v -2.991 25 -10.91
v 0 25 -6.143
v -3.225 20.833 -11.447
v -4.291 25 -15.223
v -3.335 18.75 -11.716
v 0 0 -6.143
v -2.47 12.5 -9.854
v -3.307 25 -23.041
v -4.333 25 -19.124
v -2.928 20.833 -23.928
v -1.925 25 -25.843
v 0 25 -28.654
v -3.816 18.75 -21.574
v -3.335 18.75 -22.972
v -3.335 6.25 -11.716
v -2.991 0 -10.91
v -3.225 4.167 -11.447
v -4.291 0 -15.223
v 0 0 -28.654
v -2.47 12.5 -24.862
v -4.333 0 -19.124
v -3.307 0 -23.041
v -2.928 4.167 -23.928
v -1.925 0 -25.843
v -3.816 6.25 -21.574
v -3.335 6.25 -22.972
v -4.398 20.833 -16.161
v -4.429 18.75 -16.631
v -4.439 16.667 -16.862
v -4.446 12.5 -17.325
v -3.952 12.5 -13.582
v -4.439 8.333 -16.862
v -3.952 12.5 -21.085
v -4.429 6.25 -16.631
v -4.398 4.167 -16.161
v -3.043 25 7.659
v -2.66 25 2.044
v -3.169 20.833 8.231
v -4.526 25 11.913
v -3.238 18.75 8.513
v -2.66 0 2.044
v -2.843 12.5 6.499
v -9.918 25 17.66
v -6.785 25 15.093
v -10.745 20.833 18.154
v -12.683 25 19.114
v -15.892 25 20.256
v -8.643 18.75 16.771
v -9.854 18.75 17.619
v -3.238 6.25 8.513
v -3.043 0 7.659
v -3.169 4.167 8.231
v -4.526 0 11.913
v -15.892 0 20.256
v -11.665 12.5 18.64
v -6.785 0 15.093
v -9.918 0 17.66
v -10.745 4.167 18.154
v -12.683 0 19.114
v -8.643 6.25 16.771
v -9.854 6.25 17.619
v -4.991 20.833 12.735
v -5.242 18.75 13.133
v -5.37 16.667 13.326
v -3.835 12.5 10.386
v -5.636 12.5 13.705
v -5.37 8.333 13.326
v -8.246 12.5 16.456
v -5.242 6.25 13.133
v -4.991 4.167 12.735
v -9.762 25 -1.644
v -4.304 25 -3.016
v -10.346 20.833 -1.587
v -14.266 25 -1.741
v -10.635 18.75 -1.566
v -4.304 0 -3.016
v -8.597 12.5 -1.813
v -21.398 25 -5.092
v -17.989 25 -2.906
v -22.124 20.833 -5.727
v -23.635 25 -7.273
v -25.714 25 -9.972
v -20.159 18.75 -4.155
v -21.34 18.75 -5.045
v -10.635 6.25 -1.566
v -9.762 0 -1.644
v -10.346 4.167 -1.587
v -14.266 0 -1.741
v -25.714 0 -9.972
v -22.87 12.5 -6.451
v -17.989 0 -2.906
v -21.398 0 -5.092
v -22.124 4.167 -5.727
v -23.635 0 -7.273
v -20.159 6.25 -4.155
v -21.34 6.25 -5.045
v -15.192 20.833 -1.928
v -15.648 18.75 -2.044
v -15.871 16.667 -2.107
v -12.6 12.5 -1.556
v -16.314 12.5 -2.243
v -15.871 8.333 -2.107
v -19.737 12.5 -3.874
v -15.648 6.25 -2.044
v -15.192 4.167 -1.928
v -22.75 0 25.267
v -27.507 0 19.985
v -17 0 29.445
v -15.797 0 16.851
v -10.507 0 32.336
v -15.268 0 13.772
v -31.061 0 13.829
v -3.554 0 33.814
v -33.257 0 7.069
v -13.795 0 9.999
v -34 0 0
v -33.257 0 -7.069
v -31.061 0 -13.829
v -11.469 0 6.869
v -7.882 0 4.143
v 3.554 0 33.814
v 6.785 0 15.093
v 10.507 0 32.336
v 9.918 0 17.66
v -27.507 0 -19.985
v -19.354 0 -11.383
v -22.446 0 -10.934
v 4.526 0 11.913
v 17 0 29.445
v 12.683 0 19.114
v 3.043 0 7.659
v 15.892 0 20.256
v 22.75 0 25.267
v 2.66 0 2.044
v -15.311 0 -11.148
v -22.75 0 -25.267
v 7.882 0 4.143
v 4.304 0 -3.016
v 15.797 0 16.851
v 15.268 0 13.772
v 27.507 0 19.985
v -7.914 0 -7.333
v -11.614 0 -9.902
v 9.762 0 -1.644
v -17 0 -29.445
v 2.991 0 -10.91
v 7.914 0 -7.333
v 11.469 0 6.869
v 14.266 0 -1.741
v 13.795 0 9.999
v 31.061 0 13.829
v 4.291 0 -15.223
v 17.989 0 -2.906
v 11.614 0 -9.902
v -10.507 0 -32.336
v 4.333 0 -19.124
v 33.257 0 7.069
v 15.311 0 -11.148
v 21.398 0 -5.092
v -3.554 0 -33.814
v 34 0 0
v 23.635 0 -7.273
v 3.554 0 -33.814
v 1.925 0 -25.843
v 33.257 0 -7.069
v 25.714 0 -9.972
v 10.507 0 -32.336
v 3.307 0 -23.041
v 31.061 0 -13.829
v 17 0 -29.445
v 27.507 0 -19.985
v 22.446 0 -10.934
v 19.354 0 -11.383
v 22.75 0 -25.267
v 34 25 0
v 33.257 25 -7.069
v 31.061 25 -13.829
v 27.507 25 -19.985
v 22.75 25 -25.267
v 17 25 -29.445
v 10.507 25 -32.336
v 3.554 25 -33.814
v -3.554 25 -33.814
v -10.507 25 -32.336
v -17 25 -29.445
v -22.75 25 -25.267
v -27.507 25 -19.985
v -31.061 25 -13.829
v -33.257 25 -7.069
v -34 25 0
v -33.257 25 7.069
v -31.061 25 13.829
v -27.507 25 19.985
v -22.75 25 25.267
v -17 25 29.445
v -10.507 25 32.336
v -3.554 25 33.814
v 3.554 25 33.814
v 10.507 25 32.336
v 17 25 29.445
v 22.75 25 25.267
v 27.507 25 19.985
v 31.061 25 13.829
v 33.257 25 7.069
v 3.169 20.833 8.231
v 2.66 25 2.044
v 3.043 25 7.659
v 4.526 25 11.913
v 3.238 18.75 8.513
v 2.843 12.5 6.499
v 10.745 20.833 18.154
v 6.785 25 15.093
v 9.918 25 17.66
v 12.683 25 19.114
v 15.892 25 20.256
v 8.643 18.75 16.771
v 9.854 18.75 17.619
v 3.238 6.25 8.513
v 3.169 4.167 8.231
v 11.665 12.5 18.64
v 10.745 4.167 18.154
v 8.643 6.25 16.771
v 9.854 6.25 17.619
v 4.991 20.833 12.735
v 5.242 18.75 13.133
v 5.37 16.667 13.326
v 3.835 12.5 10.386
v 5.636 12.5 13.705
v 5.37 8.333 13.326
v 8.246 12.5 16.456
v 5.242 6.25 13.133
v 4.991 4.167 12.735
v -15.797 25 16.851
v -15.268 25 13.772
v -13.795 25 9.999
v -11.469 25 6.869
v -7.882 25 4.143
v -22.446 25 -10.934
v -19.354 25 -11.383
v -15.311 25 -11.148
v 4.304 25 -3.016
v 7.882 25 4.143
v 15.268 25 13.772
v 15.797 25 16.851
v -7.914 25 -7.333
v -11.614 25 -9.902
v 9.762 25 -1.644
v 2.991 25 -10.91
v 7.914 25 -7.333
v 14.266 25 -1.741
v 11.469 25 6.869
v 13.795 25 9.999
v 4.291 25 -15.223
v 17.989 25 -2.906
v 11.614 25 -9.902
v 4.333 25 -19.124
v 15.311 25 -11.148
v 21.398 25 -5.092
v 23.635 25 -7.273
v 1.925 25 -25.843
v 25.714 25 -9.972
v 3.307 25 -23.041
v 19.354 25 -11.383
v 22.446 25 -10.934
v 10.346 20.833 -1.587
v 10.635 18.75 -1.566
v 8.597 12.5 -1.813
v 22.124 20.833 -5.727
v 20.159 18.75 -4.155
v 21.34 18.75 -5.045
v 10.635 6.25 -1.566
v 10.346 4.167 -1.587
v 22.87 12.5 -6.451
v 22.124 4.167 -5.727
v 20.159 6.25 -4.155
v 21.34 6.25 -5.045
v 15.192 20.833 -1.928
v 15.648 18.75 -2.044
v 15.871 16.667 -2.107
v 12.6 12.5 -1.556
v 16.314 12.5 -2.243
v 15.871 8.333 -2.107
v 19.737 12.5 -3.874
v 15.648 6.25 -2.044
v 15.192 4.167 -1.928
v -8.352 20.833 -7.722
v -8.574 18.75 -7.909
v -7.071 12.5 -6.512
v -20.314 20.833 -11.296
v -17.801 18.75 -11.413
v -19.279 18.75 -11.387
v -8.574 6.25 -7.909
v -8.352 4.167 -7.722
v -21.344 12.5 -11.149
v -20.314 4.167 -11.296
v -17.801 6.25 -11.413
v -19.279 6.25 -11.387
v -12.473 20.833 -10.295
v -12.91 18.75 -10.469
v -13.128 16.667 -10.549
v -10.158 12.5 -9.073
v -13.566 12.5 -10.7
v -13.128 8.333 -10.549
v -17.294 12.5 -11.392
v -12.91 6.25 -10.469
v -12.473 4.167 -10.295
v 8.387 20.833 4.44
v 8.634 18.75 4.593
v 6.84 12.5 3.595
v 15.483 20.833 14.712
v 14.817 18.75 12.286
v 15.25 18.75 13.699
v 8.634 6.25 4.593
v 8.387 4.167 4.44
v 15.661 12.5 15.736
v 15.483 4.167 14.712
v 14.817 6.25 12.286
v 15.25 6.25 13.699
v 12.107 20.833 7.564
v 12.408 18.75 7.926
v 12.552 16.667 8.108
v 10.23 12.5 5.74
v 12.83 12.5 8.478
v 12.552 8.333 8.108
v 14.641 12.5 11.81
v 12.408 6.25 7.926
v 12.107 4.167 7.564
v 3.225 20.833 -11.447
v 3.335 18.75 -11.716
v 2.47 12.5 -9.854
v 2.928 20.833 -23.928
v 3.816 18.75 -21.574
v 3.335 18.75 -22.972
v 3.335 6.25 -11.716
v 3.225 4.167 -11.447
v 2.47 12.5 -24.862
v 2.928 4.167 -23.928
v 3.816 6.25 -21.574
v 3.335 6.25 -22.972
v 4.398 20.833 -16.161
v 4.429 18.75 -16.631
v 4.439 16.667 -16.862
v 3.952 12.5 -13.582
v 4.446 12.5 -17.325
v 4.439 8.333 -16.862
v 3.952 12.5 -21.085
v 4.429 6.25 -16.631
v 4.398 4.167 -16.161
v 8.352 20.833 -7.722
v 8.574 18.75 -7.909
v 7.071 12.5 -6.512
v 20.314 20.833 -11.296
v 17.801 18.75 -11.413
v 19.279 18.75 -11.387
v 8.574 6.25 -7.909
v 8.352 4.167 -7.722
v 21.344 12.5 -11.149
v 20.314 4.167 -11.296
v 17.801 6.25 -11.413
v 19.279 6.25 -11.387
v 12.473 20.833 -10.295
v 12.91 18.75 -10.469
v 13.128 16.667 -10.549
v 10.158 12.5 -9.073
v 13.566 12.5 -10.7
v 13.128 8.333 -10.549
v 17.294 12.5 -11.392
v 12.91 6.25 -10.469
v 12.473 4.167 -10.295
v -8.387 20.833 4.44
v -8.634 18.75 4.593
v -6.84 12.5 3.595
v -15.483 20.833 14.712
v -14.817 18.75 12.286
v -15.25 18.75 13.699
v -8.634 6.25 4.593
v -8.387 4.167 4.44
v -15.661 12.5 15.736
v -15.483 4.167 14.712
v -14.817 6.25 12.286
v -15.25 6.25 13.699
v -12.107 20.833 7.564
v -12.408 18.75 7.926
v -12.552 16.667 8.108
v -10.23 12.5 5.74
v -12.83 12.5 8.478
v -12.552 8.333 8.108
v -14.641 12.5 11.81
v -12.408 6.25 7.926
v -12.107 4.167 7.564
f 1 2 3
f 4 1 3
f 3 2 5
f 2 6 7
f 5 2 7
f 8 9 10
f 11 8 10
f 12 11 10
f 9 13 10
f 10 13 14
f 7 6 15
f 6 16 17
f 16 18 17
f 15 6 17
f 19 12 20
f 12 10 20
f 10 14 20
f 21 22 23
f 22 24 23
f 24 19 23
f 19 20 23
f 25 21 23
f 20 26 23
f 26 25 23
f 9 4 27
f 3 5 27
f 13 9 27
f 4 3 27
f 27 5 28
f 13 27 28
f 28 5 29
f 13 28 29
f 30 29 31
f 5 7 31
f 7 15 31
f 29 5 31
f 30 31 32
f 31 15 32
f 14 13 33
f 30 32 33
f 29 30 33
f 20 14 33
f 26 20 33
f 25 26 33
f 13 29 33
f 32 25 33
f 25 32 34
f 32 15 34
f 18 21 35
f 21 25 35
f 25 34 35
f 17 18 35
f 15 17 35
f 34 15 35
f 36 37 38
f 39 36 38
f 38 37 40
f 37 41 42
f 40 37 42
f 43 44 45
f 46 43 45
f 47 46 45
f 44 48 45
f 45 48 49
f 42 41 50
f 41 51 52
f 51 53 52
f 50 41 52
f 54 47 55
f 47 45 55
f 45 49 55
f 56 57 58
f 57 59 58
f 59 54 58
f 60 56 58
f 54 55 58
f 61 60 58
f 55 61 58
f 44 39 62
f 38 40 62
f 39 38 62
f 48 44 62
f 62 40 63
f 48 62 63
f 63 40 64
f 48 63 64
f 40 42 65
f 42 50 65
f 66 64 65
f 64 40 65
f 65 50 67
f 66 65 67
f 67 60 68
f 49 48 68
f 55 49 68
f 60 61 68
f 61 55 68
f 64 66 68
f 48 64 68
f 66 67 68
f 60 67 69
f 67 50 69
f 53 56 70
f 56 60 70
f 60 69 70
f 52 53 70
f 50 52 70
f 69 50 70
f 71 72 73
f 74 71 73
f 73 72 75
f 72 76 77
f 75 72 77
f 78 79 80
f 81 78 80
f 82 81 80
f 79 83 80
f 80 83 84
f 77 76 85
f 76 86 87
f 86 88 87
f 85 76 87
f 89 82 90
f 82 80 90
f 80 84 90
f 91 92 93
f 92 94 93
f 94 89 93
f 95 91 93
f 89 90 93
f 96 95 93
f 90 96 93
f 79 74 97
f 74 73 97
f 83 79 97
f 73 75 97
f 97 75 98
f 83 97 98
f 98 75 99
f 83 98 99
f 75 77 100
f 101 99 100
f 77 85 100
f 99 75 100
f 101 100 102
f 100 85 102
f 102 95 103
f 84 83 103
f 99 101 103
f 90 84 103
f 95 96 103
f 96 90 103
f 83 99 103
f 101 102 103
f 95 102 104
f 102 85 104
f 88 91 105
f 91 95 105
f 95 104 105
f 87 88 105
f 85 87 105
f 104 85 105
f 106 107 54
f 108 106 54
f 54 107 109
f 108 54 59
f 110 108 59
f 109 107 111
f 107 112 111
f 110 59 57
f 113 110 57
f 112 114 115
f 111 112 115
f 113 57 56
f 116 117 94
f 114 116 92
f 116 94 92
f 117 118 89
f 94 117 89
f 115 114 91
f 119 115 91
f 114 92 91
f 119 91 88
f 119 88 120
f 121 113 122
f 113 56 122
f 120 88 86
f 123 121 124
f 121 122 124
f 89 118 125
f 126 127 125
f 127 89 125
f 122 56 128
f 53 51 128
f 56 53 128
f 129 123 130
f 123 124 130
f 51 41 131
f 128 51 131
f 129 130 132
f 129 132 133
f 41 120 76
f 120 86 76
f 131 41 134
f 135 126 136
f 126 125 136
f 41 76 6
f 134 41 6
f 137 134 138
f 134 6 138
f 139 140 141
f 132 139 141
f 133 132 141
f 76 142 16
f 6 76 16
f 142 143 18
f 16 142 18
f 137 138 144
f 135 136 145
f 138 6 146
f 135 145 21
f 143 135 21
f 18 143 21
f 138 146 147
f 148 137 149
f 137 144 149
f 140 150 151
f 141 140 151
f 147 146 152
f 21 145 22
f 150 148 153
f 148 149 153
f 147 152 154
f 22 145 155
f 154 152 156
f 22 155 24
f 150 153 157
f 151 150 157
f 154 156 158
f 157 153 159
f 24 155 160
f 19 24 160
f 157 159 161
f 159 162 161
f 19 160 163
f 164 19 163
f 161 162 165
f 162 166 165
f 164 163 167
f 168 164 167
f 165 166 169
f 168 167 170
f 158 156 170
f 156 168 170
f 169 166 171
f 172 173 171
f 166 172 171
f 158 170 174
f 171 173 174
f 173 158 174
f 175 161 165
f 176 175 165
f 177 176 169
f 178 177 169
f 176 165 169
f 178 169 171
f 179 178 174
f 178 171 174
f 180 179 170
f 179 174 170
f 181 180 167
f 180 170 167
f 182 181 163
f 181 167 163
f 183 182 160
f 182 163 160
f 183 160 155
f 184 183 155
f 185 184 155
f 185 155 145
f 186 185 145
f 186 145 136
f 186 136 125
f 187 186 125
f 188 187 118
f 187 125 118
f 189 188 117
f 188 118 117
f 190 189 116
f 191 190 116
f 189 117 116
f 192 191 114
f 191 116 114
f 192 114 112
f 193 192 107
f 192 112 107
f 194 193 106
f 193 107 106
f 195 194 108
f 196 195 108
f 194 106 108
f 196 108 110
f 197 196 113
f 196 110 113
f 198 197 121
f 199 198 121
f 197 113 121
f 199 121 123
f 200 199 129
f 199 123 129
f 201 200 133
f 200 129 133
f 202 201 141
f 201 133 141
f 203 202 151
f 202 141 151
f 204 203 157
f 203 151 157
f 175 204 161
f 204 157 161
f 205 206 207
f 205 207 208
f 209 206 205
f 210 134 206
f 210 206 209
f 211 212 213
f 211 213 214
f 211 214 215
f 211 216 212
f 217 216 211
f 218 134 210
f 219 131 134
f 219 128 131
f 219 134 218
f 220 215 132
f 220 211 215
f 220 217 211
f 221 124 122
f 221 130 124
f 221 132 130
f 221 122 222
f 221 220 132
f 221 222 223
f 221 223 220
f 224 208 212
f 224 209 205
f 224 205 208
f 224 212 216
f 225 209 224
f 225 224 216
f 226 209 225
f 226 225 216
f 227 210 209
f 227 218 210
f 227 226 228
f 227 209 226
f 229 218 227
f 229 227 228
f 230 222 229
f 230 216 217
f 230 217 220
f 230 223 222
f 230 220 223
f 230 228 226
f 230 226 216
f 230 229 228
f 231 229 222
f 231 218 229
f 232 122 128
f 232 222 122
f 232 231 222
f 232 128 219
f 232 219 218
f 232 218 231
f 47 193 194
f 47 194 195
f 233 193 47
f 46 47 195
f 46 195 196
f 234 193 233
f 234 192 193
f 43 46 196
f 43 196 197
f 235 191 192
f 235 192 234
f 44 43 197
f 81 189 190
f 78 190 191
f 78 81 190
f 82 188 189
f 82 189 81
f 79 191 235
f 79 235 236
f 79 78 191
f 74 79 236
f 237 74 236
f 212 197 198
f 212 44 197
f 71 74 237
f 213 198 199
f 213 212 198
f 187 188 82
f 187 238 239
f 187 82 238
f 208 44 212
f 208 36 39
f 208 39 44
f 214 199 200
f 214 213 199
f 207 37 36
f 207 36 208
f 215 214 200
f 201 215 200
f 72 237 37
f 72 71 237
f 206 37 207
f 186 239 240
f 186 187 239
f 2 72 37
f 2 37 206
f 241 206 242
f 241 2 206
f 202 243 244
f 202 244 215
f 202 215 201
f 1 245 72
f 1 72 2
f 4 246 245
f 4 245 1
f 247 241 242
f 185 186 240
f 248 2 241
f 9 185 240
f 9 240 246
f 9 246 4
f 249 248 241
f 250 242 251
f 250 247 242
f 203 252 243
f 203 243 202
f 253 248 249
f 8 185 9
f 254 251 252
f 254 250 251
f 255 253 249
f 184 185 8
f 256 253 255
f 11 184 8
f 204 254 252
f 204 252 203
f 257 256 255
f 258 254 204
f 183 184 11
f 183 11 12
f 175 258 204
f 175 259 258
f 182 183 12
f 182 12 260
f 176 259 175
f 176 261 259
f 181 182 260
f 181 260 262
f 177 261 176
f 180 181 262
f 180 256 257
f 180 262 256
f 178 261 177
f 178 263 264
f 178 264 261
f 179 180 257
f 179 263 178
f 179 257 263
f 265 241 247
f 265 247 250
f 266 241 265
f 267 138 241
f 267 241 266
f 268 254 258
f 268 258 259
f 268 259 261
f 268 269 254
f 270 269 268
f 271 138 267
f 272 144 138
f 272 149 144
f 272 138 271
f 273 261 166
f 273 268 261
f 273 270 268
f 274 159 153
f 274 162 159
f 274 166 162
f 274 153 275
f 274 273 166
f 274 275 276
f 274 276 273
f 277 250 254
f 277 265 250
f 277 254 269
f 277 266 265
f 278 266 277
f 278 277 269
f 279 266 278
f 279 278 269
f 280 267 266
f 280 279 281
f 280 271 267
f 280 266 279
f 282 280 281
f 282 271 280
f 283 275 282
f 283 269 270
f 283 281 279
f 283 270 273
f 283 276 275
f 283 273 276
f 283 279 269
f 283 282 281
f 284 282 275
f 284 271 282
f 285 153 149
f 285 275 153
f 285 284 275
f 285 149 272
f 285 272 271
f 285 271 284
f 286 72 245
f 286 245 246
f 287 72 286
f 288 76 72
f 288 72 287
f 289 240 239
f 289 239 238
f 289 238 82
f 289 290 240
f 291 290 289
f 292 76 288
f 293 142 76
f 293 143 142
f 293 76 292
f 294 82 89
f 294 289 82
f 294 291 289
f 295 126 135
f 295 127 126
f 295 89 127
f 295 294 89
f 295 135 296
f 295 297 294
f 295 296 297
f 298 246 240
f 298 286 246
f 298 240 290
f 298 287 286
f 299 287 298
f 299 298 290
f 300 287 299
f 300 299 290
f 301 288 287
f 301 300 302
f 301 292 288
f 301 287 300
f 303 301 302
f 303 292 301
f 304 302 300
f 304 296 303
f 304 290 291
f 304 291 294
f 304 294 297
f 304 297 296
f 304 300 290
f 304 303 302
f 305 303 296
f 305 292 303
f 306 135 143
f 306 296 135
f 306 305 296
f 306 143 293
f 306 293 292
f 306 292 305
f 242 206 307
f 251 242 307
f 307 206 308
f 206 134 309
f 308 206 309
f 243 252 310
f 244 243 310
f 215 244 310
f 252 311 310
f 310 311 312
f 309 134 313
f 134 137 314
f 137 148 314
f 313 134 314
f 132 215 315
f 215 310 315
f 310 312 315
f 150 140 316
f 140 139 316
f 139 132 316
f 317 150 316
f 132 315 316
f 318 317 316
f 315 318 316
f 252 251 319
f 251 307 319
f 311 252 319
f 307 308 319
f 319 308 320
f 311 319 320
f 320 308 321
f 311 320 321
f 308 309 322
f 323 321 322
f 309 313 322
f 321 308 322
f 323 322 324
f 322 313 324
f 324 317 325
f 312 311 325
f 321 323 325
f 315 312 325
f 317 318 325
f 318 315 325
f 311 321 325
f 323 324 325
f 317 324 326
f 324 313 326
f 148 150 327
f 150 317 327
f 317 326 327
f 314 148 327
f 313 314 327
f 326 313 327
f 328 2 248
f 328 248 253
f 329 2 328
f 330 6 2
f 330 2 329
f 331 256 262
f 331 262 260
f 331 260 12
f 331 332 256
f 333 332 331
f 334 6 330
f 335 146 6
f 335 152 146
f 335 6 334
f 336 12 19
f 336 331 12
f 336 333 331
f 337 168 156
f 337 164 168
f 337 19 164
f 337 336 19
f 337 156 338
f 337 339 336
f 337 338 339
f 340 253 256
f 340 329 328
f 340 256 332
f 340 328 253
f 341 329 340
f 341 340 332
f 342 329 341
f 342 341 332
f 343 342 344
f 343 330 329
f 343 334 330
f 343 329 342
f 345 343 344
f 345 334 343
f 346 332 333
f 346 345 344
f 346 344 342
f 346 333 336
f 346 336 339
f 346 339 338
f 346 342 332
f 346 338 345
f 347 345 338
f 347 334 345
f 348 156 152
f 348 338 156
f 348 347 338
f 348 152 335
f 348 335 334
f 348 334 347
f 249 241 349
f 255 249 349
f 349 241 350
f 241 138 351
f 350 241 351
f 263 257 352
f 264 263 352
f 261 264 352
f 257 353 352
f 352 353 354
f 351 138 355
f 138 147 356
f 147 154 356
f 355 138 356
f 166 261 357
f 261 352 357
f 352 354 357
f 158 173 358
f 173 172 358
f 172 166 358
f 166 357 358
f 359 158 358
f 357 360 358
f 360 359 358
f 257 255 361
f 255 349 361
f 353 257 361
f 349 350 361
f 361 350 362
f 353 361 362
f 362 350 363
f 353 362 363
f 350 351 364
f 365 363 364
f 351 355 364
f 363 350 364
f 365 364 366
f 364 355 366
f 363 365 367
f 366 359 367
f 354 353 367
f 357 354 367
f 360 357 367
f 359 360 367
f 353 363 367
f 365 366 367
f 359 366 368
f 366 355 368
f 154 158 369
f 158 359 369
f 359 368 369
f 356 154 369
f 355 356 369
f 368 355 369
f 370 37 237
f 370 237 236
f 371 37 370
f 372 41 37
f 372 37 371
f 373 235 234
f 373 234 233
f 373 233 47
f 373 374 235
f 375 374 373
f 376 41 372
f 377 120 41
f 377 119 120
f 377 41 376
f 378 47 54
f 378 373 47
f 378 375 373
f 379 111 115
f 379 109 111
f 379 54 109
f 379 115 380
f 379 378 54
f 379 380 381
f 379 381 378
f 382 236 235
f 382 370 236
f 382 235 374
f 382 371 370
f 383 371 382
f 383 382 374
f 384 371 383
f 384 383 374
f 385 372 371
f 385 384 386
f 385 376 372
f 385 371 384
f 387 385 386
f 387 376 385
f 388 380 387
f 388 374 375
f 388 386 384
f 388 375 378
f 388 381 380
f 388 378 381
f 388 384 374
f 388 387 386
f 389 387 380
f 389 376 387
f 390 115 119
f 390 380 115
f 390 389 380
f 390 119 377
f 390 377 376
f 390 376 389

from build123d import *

# Parameters (mm, degrees)
SKETCH_1_R          = 34
EXTRUDE_1_DEPTH     = 25
CUT_EXTRUDE_1_DEPTH = 25


with BuildPart() as part:
    # 草图1 → 凸台-拉伸1 (new body)
    with BuildSketch(Plane(origin=(0, 0, 0), x_dir=(1, 0, 0), z_dir=(0, 1, 0))):
        Circle(SKETCH_1_R)
    extrude(amount=EXTRUDE_1_DEPTH)

    # 草图2 → 切除-拉伸1 (cut)
    with BuildSketch(Plane.XZ):
        with BuildLine():
            add(Edge.make_bspline(
                [(0, -6.142670146), (8.892207312, -17.25267682), (0, -28.653962674)],
                knots=[0, 0, 0, 1, 1, 1], degree=2))
            add(Edge.make_bspline(
                [(0, -6.142670146), (-8.892207312, -17.25267682), (0, -28.653962674)],
                knots=[0, 0, 0, 1, 1, 1], degree=2))
        make_face()
        with BuildLine():
            add(Edge.make_bspline(
                [(-4.304164555, -3.01551155), (-17.618251974, 2.008299288), (-25.713676003, -9.971883506)],
                knots=[0, 0, 0, 1, 1, 1], degree=2))
            add(Edge.make_bspline(
                [(-4.304164555, -3.01551155), (-12.122565621, -14.905684128), (-25.713676003, -9.971883506)],
                knots=[0, 0, 0, 1, 1, 1], degree=2))
        make_face()
        with BuildLine():
            add(Edge.make_bspline(
                [(-2.660119988, 2.044337347), (-1.996471231, 16.259229872), (-15.891925746, 20.256355567)],
                knots=[0, 0, 0, 1, 1, 1], degree=2))
            add(Edge.make_bspline(
                [(-2.660119988, 2.044337347), (-16.384364896, 5.805813236), (-15.891925746, 20.256355567)],
                knots=[0, 0, 0, 1, 1, 1], degree=2))
        make_face()
        with BuildLine():
            add(Edge.make_bspline(
                [(2.660119988, 2.044337347), (16.384364896, 5.805813236), (15.891925746, 20.256355567)],
                knots=[0, 0, 0, 1, 1, 1], degree=2))
            add(Edge.make_bspline(
                [(2.660119988, 2.044337347), (1.996471231, 16.259229872), (15.891925746, 20.256355567)],
                knots=[0, 0, 0, 1, 1, 1], degree=2))
        make_face()
        with BuildLine():
            add(Edge.make_bspline(
                [(4.304164555, -3.01551155), (12.122565621, -14.905684128), (25.713676003, -9.971883506)],
                knots=[0, 0, 0, 1, 1, 1], degree=2))
            add(Edge.make_bspline(
                [(4.304164555, -3.01551155), (17.618251974, 2.008299288), (25.713676003, -9.971883506)],
                knots=[0, 0, 0, 1, 1, 1], degree=2))
        make_face()
    extrude(amount=-CUT_EXTRUDE_1_DEPTH, mode=Mode.SUBTRACT)


solid = part.part
